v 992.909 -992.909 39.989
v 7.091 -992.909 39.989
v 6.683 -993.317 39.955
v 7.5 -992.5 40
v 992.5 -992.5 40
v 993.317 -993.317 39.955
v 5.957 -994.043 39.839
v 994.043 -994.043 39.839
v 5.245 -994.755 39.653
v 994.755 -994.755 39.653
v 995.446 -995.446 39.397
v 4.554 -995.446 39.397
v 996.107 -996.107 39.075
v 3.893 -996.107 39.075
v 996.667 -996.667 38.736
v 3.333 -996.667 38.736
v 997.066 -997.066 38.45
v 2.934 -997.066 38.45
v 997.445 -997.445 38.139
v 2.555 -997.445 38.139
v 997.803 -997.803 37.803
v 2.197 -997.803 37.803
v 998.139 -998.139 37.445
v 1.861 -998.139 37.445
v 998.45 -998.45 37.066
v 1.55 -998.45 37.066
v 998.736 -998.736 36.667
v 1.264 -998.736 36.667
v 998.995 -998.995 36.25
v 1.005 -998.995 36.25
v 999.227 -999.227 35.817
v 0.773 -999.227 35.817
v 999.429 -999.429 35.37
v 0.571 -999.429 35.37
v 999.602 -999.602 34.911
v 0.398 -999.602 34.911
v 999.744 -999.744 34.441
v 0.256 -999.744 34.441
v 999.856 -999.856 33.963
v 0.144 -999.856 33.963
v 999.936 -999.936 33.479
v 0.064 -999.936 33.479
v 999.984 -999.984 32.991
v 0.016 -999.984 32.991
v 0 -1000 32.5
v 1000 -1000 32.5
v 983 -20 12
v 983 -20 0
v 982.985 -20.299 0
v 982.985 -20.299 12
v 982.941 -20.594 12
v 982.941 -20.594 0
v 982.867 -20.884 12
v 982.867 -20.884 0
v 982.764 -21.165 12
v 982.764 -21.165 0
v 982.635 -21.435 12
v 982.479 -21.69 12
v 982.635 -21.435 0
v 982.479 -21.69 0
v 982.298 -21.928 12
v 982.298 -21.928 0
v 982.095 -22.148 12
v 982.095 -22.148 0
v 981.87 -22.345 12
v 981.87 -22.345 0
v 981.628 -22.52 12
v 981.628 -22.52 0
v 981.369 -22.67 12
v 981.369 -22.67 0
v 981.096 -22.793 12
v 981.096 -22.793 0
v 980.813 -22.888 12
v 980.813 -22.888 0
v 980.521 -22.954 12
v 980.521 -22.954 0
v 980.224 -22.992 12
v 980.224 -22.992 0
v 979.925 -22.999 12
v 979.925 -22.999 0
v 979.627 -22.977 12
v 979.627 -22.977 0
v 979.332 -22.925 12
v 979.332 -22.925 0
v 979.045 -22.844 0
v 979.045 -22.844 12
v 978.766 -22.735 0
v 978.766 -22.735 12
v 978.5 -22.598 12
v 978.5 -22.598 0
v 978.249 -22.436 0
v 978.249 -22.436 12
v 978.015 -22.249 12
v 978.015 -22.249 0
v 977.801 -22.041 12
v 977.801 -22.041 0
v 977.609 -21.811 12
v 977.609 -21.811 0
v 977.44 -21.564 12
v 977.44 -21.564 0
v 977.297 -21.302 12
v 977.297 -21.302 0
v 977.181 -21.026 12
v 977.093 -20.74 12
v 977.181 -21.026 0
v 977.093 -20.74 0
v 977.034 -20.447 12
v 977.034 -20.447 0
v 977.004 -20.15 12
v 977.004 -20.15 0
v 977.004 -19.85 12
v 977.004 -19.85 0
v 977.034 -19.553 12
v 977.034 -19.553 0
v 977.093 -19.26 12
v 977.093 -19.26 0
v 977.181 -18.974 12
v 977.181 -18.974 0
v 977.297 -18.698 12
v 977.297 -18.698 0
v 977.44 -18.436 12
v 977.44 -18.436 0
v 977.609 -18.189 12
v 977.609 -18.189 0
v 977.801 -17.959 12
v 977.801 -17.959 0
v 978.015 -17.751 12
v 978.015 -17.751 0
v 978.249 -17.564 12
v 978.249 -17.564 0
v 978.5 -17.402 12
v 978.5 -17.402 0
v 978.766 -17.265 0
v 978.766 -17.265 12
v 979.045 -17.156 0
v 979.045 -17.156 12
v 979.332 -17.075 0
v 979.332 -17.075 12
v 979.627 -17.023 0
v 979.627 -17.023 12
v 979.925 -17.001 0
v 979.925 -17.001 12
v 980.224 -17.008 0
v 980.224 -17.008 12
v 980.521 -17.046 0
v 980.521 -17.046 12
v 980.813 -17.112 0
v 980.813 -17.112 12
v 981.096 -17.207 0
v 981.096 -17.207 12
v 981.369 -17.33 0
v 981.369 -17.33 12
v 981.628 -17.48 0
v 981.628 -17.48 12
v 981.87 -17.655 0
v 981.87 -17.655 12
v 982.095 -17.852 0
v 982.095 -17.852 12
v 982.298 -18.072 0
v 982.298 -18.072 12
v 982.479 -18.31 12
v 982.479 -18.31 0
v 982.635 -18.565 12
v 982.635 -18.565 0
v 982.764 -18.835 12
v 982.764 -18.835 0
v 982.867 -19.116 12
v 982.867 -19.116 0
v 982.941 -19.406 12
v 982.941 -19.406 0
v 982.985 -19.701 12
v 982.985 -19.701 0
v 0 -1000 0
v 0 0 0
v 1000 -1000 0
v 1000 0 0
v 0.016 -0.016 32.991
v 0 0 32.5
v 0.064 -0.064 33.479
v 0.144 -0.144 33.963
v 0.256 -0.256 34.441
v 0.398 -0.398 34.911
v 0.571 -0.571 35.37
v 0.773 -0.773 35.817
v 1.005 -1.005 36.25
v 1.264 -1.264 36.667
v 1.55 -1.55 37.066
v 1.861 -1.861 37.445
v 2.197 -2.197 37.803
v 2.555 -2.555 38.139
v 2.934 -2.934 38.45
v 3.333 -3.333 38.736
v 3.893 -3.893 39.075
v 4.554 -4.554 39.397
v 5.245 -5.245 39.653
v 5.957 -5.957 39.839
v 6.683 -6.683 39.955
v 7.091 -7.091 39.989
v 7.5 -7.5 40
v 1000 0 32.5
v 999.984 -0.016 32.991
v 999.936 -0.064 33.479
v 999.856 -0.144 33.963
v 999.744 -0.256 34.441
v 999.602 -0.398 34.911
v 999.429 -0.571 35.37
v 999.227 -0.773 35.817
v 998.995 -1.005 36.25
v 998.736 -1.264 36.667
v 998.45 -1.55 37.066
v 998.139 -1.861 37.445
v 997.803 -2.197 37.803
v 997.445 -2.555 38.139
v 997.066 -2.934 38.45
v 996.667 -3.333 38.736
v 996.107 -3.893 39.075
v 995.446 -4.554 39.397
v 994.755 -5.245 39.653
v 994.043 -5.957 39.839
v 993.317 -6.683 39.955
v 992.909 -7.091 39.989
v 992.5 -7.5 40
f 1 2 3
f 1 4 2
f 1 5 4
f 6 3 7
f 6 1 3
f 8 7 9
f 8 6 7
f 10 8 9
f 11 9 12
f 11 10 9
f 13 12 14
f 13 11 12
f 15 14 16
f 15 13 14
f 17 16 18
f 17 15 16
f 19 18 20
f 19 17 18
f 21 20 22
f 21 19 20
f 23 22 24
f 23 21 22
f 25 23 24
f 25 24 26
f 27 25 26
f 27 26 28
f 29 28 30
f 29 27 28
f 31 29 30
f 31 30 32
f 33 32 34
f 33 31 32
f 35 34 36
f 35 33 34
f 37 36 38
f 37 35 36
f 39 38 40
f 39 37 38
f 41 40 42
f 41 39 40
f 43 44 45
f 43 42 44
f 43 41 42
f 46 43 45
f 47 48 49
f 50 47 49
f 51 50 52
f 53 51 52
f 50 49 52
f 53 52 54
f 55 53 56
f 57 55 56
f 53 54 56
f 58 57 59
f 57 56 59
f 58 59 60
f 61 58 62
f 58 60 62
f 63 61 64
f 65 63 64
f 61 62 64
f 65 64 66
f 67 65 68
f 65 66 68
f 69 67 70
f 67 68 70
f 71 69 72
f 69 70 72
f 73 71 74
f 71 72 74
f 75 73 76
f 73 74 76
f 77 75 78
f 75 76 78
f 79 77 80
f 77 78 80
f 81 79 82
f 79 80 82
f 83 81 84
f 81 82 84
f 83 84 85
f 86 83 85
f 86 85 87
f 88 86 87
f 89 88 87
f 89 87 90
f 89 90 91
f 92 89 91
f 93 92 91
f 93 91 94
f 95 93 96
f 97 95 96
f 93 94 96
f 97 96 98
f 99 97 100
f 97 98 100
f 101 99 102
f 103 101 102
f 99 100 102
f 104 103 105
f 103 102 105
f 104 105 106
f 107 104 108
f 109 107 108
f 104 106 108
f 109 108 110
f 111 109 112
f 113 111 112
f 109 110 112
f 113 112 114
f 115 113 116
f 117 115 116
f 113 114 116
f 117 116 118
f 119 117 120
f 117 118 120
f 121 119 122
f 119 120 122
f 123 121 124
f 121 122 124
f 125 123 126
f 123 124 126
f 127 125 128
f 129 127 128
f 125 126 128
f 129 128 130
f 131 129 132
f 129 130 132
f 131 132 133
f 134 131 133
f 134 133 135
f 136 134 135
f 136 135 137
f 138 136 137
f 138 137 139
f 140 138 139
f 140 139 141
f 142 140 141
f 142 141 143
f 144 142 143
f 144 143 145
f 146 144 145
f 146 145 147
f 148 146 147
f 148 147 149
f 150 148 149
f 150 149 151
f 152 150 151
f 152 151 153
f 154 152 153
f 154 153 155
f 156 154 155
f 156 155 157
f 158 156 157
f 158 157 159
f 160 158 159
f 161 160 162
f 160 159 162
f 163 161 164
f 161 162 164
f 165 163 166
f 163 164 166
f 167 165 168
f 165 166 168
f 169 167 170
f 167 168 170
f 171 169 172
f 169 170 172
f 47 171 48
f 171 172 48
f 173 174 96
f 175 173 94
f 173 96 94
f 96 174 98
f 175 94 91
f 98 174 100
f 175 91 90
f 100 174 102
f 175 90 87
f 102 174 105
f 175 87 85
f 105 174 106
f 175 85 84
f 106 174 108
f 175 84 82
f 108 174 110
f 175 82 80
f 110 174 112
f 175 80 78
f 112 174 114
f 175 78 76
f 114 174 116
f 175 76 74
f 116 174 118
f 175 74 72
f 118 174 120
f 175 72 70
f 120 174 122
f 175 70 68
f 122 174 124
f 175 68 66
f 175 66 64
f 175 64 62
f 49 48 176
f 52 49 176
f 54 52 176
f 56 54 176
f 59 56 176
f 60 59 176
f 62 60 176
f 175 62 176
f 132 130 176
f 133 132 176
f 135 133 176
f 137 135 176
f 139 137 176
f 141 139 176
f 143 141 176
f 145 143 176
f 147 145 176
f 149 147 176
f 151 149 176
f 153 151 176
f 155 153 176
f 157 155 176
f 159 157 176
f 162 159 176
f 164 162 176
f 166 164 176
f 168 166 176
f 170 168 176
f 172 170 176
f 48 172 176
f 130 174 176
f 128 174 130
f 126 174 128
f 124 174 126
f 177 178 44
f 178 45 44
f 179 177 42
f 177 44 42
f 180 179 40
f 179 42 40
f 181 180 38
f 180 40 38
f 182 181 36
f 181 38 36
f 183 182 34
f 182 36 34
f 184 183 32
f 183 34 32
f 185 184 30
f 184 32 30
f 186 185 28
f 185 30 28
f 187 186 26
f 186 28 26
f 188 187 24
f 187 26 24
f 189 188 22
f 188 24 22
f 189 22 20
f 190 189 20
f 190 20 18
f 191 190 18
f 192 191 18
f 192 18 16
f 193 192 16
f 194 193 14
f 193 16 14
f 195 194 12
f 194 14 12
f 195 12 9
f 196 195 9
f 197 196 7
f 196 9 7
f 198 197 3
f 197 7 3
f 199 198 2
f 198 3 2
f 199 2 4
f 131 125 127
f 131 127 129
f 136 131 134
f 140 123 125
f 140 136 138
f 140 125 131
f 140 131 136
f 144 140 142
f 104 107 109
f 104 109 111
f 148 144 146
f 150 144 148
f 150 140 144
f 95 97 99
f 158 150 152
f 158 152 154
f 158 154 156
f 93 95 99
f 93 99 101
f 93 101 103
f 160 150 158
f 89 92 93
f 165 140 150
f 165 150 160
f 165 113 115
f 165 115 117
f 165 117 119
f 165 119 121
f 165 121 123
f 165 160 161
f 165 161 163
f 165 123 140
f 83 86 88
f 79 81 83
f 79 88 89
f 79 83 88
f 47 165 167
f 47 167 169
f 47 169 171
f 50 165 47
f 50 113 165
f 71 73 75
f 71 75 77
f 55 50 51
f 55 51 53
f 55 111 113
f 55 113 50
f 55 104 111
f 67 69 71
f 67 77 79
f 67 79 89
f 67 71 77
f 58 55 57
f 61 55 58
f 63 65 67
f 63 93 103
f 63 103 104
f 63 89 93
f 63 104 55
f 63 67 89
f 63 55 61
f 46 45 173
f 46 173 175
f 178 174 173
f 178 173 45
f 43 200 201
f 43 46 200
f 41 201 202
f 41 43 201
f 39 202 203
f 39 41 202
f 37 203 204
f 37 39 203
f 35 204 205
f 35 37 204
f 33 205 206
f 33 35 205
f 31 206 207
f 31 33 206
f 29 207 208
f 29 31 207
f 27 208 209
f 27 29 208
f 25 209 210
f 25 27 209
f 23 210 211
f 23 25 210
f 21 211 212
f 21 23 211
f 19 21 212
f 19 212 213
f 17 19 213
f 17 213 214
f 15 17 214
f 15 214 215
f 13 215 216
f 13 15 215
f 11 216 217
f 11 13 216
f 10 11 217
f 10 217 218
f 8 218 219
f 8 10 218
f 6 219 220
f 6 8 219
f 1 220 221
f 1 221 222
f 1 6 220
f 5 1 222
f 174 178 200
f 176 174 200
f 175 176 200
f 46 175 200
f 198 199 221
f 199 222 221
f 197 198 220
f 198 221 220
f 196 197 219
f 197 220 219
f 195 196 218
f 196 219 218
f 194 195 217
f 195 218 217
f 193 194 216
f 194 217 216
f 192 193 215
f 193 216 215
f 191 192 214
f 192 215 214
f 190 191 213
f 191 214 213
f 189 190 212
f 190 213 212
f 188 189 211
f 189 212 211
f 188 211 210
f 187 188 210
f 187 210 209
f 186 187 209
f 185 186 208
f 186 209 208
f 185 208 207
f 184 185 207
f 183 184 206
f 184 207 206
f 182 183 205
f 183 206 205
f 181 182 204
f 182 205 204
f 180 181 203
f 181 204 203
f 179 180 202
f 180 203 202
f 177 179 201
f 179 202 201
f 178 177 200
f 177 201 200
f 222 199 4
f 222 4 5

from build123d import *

# Parameters (mm, degrees)
F0_W     = 1000
F0_H     = 40
F1_DEPTH = 1000
F2_R     = 7.5
F3_R     = 3
F4_DEPTH = 12


with BuildPart() as f1:
    # F0 (on Front) → F1 (new body)
    with BuildSketch(Plane.XZ):
        with Locations((500, 20)):
            Rectangle(F0_W, F0_H)
    extrude(amount=F1_DEPTH)

    # F2
    f2_edges = [f1.edges().sort_by_distance(p)[0] for p in [
        (1000, -500, 40),
        (0, -500, 40),
        (500, 0, 40),
        (500, -1000, 40),
    ]]
    fillet(f2_edges, radius=F2_R)

    # F3 (on face) → F4 (cut)
    with BuildSketch(Plane(origin=(0, 0, 0), x_dir=(1, 0, 0), z_dir=(0, 0, -1))):
        with Locations((980, 20)):
            Circle(F3_R)
    extrude(amount=-F4_DEPTH, mode=Mode.SUBTRACT)


solid = f1.part
